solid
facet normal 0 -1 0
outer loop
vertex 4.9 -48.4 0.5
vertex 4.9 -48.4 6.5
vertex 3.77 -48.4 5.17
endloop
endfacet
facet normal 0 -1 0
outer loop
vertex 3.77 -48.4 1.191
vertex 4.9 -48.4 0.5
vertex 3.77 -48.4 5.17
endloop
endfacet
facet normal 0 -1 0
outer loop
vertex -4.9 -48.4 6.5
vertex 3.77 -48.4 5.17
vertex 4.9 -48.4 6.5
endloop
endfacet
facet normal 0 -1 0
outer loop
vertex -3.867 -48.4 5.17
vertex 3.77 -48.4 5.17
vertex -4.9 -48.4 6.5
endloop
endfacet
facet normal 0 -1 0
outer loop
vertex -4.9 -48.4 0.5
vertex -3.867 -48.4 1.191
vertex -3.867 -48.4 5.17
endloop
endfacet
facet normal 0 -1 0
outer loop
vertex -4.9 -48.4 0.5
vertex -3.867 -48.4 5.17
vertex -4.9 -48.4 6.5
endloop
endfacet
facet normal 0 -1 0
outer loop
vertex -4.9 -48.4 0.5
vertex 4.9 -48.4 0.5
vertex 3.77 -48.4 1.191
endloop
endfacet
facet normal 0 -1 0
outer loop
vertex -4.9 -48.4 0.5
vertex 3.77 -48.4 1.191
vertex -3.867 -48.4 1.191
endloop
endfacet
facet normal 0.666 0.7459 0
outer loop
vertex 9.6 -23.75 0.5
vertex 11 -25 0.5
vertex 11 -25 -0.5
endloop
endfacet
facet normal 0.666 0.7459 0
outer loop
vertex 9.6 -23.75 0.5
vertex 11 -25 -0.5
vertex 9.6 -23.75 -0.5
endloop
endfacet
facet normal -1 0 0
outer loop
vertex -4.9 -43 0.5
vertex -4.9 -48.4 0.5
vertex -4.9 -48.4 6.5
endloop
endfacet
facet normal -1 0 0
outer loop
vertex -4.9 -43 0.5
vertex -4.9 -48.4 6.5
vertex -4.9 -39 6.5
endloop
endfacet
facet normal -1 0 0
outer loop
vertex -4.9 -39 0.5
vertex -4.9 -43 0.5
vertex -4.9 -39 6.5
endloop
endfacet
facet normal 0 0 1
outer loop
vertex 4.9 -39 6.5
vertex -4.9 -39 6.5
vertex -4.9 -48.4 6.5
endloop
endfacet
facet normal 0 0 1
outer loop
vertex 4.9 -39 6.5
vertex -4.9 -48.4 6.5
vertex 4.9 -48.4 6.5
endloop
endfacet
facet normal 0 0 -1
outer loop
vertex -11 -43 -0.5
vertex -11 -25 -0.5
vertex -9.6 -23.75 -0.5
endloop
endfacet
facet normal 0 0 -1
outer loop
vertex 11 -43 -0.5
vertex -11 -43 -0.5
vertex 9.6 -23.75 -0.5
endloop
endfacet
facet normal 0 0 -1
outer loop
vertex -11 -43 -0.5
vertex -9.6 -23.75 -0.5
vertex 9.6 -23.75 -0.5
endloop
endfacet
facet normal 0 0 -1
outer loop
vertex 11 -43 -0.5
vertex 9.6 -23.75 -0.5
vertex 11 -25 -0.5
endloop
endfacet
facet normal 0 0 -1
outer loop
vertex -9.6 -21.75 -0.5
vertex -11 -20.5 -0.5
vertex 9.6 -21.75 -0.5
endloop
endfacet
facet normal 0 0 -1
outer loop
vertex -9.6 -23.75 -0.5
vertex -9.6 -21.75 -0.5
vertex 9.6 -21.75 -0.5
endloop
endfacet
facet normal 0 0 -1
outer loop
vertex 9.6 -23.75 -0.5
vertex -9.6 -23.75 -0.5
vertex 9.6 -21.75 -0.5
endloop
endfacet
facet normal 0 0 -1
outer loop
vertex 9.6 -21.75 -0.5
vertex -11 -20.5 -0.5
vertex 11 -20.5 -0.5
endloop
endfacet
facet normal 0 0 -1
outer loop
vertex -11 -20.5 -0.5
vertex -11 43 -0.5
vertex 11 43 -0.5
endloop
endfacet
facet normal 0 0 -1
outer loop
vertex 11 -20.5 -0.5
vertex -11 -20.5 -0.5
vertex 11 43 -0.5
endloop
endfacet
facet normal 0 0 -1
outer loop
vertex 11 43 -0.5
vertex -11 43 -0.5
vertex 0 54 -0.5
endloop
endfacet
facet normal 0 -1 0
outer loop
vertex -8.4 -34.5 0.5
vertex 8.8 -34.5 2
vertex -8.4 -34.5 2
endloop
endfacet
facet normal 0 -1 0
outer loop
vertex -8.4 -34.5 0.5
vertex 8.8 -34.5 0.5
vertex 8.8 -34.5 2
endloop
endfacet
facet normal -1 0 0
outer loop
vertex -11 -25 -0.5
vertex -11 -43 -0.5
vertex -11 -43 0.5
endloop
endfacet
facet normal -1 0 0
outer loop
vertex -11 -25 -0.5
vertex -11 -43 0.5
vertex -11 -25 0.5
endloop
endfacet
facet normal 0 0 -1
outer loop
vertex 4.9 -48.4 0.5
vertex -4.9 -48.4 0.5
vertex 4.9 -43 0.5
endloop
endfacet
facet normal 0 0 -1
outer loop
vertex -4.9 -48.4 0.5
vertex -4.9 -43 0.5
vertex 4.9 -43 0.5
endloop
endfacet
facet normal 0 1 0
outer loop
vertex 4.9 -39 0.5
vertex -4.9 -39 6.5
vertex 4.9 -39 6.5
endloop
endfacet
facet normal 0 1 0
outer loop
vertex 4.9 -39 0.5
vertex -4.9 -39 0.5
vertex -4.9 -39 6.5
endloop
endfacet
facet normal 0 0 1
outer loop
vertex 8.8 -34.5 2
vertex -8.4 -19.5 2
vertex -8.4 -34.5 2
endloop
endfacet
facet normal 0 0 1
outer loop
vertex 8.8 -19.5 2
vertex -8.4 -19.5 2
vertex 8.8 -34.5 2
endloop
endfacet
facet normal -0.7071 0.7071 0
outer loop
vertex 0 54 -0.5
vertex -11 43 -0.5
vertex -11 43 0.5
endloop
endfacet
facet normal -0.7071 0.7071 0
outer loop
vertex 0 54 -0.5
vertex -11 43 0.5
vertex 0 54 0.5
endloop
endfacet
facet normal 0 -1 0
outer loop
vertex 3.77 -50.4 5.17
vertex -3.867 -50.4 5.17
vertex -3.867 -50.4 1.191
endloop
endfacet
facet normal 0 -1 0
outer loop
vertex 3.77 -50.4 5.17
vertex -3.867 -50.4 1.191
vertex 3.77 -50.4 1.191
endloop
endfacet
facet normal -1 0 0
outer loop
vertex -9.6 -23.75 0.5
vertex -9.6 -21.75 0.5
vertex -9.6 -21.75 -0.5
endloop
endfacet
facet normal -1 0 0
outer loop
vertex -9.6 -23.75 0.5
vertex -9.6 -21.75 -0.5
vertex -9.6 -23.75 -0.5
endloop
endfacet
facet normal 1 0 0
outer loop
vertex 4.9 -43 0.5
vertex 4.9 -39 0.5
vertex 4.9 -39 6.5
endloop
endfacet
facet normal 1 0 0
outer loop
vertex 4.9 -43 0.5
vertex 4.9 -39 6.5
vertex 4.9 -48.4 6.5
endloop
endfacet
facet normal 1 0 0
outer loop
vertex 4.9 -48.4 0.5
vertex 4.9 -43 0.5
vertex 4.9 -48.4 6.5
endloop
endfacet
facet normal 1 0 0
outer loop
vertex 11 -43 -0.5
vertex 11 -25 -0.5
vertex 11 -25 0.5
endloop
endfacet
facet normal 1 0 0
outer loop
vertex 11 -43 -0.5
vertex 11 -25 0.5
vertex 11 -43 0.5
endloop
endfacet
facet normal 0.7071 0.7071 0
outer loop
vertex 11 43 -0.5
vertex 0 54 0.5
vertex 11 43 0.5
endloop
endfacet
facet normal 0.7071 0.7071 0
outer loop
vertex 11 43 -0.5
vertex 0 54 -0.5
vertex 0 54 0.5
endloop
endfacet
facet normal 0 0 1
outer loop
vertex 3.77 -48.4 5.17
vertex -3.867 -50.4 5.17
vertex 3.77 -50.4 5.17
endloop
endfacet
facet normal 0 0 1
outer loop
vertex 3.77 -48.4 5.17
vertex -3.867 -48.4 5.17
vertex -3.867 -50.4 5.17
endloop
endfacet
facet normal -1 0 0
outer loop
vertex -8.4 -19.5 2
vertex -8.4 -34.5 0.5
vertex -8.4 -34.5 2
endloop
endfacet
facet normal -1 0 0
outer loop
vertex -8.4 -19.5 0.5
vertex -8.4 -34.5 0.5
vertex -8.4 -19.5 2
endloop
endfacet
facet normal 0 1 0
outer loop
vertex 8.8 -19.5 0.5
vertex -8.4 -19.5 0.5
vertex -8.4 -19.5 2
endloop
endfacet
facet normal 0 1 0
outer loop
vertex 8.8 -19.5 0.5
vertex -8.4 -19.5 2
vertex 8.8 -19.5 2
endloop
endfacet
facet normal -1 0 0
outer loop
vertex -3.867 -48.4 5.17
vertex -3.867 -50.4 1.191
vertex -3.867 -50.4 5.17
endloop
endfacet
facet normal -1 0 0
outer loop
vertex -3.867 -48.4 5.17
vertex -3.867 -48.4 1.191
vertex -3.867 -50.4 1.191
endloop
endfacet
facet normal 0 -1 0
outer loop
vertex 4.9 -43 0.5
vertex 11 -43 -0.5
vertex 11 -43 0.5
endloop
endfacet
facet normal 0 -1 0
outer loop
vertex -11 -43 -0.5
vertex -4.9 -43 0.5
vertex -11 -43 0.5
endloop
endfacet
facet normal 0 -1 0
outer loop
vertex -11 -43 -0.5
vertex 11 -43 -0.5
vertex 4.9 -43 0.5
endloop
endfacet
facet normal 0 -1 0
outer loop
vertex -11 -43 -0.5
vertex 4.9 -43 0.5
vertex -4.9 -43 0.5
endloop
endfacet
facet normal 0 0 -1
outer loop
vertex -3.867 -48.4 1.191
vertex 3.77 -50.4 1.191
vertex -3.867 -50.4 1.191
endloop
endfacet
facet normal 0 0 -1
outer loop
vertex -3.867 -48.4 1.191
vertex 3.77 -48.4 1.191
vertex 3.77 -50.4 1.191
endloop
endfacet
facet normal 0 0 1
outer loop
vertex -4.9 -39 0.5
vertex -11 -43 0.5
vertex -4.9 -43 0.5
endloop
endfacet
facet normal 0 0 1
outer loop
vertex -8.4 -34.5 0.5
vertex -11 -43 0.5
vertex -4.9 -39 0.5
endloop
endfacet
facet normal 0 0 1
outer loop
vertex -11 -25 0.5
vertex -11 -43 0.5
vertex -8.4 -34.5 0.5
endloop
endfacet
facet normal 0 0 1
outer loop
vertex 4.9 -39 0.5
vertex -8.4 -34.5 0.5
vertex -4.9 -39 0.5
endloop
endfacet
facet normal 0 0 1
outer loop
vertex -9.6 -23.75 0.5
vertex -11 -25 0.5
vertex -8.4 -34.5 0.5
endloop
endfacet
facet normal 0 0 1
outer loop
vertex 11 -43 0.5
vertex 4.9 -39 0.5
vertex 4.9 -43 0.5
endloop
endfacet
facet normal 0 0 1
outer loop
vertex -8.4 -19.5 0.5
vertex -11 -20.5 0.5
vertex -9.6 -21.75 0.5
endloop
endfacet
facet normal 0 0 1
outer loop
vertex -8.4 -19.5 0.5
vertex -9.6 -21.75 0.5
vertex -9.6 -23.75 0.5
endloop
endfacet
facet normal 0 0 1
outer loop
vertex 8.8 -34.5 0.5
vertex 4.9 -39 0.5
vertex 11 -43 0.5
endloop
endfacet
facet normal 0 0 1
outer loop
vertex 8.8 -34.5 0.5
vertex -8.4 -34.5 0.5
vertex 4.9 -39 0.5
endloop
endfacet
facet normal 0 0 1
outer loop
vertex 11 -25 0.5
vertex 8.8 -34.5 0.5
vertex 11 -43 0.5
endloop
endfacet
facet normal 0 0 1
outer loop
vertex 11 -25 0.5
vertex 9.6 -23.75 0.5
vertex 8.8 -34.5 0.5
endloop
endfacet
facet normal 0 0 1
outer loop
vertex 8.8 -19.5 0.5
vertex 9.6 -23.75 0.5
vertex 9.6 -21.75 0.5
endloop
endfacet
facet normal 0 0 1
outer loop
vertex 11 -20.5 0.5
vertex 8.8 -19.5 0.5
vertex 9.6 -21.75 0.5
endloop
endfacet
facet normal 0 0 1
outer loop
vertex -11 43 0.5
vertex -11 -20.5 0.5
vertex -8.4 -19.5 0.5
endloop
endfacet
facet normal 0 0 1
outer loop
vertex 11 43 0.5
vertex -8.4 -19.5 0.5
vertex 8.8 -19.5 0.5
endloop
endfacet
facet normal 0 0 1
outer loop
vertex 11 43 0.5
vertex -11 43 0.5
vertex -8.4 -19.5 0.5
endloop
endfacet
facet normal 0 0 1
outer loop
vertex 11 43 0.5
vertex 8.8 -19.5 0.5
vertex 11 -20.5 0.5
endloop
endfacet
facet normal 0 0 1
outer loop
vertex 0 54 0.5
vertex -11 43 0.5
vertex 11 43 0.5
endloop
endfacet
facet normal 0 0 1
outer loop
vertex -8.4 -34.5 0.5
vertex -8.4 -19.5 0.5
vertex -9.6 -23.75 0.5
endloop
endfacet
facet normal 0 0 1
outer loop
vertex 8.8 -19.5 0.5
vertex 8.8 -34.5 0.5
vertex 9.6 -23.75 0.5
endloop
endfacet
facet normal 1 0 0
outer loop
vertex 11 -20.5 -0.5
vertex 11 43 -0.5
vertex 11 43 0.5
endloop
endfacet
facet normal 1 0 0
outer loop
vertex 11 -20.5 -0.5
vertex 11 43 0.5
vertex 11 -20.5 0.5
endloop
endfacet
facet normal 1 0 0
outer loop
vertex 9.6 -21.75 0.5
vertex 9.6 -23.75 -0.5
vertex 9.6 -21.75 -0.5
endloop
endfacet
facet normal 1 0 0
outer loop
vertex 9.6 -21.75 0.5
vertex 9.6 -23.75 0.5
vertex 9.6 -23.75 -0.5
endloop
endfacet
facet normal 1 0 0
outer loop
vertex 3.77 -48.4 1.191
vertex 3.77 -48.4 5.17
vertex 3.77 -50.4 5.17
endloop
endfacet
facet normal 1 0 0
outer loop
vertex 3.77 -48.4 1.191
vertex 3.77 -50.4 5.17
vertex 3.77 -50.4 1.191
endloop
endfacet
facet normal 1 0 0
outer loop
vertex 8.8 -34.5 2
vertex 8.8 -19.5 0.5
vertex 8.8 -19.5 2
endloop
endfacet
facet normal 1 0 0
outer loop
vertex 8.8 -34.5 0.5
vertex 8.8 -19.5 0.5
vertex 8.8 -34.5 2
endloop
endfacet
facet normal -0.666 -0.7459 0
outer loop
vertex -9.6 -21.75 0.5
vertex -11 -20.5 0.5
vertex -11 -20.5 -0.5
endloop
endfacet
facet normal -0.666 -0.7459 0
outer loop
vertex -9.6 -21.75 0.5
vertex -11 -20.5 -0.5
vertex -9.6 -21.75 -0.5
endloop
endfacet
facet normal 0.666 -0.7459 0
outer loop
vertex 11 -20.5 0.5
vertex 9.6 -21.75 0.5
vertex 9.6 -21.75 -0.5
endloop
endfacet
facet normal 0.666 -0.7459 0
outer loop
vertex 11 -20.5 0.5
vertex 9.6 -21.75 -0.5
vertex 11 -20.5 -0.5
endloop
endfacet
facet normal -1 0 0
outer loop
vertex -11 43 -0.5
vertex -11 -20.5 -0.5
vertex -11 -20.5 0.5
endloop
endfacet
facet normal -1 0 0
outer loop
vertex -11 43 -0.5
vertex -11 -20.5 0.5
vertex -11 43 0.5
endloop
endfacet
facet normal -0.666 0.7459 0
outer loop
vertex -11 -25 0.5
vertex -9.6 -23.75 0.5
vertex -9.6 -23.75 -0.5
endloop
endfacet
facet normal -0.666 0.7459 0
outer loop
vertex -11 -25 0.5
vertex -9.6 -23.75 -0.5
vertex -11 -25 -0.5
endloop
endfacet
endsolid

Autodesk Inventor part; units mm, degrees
ref_plane "YZ Plane" through (0, 0, 0) normal (1, 0, 0) x (0, 1, 0)
ref_plane "XZ Plane" through (0, 0, 0) normal (0, 1, 0) x (-1, 0, 0)
ref_plane "XY Plane" through (0, 0, 0) normal (0, 0, 1) x (1, 0, 0)
sketch "Skizze1" plane through (0, 0, 0) normal (0, 0, 1) x (1, 0, 0)
  line L0 (11, -43) -> (-11, -43)
  line L1 (-11, -43) -> (-11, 43)
  line L2 (11, 43) -> (11, -43)
  line L3 (11, -43) -> (-11, 43) construction
  line L4 (-11, -43) -> (11, 43) construction
  line L5 (-11, 43) -> (0, 54)
  line L6 (0, 54) -> (11, 43)
  point P0 (0, 0)
  point P1 (0, 0)
  dimension "d0" = 22
  dimension "d1" = 86
  dimension "d2" = 97
extrude "Extrusion1" add sketch "Skizze1" along normal mid plane 1
sketch "Skizze2" plane through (0, 0, 0.5) normal (0, 0, 1) x (1, 0, 0)
  line L0 (-11, -20.5) -> (-9.6, -21.75)
  line L1 (-9.6, -21.75) -> (-9.6, -23.75)
  line L2 (-9.6, -23.75) -> (-11, -25)
  line L3 (-11, -25) -> (-11, -20.5)
  line L4 (-11, 43) -> (-11, -43) projected
  point P0 (0, 0)
  point P1 (-11, -22.75)
  point P2 (-9.6, -22.75)
  dimension "d5" = 1.4
  dimension "d6" = 18
  dimension "d7" = 22.5
  dimension "d8" = 2
extrude "Extrusion2" cut sketch "Skizze2" against normal blind 1
mirror "Spiegeln1" about plane through (0, 0, 0) normal (1, 0, 0) of "Extrusion2"
sketch "Skizze3" plane through (0, 0, 0.5) normal (0, 0, 1) x (1, 0, 0)
  line L0 (-4.9, -39) -> (4.9, -39)
  line L1 (4.9, -39) -> (4.9, -48.4)
  line L2 (4.9, -48.4) -> (-4.9, -48.4)
  line L3 (-4.9, -48.4) -> (-4.9, -39)
  line L4 (-11, -43) -> (11, -43) projected
  point P0 (0, 0)
  point P1 (0, -39)
  point P2 (0, -43)
  dimension "d11" = 9.4
  dimension "d12" = 9.8
  dimension "d13" = 5.4
extrude "Extrusion3" add sketch "Skizze3" along normal blind 6
sketch "Skizze4" plane through (0, 0, 0.5) normal (0, 0, 1) x (1, 0, 0)
  line L0 (-8.4, -19.5) -> (8.8, -19.5)
  line L1 (8.8, -19.5) -> (8.8, -34.5)
  line L2 (8.8, -34.5) -> (-8.4, -34.5)
  line L3 (-8.4, -34.5) -> (-8.4, -19.5)
  line L4 (4.9, -43) -> (11, -43) projected
  line L5 (11, -43) -> (11, -25) projected
  line L6 (-11, -25) -> (-11, -43) projected
  point P0 (0, 0)
  dimension "d16" = 23.5
  dimension "d19" = 8.5
  dimension "d20" = 2.2
  dimension "d21" = 2.6
extrude "Extrusion4" add sketch "Skizze4" along normal blind 1.5
sketch "Skizze5" plane through (-4.9, -48.4, 0.5) normal (0, -1, 0) x (1, 0, 0)
  line L0 (1.0328, 4.6703) -> (8.6704, 4.6703)
  line L1 (8.6704, 4.6703) -> (8.6704, 0.6911)
  line L2 (8.6704, 0.6911) -> (1.0328, 0.6911)
  line L3 (1.0328, 0.6911) -> (1.0328, 4.6703)
  point P0 (4.9, -0.5)
extrude "Extrusion5" add sketch "Skizze5" along normal blind 2
properties part number "CSM_Sensor_Dummy"
